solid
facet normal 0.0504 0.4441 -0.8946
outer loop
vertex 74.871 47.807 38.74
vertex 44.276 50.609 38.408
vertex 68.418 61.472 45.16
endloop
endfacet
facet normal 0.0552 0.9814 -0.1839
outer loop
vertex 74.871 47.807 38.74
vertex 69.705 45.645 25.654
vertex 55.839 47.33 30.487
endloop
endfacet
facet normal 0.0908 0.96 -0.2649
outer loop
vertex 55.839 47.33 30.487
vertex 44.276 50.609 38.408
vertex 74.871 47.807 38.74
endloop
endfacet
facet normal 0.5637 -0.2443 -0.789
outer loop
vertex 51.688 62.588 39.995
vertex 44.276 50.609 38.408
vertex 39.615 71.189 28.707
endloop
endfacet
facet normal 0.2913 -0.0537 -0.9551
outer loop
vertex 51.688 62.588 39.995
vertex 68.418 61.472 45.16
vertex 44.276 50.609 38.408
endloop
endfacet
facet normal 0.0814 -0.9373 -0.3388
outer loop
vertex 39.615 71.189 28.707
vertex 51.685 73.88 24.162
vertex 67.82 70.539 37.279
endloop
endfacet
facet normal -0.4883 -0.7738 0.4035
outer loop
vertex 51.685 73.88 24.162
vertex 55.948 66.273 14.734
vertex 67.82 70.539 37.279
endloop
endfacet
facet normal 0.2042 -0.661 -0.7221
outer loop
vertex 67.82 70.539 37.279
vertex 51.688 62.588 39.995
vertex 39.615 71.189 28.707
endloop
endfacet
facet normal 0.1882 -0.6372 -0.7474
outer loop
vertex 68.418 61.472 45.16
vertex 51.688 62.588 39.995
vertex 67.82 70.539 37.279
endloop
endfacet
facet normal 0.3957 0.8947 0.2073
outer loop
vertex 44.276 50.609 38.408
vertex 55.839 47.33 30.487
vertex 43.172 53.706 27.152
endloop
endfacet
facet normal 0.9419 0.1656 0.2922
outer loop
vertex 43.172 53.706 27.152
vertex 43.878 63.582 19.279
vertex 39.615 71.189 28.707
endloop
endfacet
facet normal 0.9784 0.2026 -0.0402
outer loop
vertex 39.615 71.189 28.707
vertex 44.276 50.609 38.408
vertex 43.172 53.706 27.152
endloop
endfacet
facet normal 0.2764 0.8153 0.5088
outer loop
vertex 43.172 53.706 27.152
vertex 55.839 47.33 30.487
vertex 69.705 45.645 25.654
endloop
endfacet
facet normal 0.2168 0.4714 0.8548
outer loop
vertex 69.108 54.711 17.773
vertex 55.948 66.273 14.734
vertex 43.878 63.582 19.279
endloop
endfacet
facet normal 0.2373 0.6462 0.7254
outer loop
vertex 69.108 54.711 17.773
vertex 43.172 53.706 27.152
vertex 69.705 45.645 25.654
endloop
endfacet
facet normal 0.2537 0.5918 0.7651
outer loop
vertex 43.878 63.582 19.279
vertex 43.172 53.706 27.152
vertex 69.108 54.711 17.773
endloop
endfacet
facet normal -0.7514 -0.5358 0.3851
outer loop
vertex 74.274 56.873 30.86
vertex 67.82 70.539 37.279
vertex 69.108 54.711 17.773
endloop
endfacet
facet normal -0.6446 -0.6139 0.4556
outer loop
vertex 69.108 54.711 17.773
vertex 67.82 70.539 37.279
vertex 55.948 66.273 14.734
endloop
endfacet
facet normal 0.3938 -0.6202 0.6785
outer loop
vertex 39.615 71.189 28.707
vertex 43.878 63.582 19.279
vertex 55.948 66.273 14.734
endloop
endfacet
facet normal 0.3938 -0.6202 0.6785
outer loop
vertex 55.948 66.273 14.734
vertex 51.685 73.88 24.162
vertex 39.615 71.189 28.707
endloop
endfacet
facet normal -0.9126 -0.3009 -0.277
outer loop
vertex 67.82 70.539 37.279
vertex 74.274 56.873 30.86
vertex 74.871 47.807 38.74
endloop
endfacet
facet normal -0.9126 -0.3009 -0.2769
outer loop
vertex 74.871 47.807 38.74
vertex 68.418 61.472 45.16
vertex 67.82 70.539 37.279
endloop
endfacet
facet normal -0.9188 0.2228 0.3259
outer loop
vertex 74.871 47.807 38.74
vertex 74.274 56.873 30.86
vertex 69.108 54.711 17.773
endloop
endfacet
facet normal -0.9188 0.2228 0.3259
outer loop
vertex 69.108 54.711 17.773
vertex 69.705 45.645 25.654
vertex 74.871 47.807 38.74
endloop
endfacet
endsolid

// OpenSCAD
// Auto-generated auxetic polyhedron
points = [
    [68.417669, 61.472201, 45.159591],
    [44.276002, 50.608505, 38.408264],
    [74.871415, 47.806840, 38.739770],
    [55.839436, 47.330456, 30.487188],
    [69.705184, 45.644695, 25.653646],
    [39.614894, 71.188749, 28.707194],
    [51.688004, 62.588105, 39.994544],
    [67.820495, 70.538715, 37.279332],
    [51.684982, 73.880093, 24.162111],
    [55.948334, 66.273439, 14.733763],
    [43.172173, 53.705626, 27.152013],
    [43.878245, 63.582095, 19.278847],
    [69.108009, 54.711208, 17.773387],
    [74.274240, 56.873353, 30.859511],
];

faces = [
    [0, 1, 2],
    [3, 4, 2],
    [2, 1, 3],
    [5, 1, 6],
    [1, 0, 6],
    [7, 8, 5],
    [7, 9, 8],
    [5, 6, 7],
    [7, 6, 0],
    [10, 3, 1],
    [5, 11, 10],
    [10, 1, 5],
    [4, 3, 10],
    [11, 9, 12],
    [4, 10, 12],
    [12, 10, 11],
    [12, 7, 13],
    [9, 7, 12],
    [9, 11, 5],
    [5, 8, 9],
    [2, 13, 7],
    [7, 0, 2],
    [12, 13, 2],
    [2, 4, 12],
];

polyhedron(points = points, faces = faces);
